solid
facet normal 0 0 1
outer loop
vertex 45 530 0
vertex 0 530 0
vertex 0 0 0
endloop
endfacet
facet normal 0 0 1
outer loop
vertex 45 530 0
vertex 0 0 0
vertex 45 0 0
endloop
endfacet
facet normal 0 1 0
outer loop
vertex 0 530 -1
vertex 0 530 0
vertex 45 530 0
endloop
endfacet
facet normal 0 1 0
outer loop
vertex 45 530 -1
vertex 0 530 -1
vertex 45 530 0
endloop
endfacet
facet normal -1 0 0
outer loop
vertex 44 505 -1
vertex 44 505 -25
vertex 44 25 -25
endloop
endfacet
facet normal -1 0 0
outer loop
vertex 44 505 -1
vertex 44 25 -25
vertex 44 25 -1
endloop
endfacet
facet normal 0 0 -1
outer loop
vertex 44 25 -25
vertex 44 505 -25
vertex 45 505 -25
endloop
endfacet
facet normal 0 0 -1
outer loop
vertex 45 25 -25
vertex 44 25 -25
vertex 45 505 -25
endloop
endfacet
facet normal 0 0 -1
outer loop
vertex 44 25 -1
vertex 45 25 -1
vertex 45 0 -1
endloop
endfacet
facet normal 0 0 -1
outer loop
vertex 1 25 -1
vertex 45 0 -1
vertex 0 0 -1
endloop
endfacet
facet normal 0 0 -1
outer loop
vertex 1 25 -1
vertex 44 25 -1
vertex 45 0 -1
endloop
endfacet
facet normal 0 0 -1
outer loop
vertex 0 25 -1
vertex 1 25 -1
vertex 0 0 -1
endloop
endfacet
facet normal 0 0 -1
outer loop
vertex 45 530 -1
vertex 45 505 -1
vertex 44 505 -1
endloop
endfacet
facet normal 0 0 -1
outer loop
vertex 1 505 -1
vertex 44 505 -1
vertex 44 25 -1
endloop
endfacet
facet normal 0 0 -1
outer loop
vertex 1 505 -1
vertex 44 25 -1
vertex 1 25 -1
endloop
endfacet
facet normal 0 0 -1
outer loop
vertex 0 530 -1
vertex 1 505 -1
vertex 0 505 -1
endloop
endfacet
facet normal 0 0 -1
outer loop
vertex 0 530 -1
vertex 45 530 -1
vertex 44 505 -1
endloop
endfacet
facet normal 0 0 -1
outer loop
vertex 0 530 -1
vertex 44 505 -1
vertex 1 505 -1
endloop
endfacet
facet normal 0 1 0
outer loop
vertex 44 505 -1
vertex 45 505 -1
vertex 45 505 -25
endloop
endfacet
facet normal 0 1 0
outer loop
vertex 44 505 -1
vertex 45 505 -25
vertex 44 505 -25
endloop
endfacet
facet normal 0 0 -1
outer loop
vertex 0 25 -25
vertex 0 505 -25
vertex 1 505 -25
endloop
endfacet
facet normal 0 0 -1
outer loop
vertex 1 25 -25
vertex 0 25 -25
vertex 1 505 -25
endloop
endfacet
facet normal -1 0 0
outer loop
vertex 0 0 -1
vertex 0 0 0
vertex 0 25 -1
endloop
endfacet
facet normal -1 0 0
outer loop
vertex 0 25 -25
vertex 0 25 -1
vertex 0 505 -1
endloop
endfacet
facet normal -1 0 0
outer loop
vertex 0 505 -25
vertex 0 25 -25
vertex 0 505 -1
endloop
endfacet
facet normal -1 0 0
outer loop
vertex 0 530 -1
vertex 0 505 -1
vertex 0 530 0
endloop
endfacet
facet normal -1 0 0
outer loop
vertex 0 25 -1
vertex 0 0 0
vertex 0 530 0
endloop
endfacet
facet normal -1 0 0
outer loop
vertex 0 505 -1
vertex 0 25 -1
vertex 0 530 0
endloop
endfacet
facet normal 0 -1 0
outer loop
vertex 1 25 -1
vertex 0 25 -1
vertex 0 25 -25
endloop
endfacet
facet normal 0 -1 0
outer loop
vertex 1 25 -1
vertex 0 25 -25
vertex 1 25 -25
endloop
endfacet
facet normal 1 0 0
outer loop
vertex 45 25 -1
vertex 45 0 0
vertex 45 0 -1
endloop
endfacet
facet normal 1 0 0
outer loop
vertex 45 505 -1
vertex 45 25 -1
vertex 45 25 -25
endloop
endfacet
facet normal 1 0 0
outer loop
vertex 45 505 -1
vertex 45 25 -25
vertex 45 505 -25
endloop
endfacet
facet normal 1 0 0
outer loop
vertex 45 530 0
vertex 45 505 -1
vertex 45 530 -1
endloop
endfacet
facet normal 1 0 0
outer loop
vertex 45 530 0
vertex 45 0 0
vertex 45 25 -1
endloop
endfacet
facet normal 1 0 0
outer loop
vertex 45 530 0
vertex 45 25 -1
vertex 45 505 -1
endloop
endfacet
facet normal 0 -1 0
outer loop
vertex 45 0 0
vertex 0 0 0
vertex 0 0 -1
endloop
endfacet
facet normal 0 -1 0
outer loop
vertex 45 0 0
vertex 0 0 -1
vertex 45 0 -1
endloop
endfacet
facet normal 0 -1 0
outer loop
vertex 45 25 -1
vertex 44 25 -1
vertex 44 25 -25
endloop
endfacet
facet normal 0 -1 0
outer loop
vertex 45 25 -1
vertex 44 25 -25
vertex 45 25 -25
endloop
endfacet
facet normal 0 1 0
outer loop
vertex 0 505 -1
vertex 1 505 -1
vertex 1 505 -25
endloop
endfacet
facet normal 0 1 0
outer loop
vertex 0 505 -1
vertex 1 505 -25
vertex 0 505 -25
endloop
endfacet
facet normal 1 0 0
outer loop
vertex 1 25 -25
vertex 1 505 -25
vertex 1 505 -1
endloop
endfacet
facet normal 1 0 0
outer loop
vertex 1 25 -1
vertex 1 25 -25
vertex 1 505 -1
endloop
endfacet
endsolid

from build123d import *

# Parameters (mm, degrees)
F0_W     = 45
F0_H     = 530
F1_DEPTH = 25
F2_W     = 45
F2_H     = 24
F3_DEPTH = 25
F4_W     = 45
F4_H     = 24
F5_DEPTH = 25
F6_W     = 43
F6_H     = 24
F7_DEPTH = 505.001


with BuildPart() as f1:
    # F0 (on Top) → F1 (new body)
    with BuildSketch(Plane.XY):
        with Locations((22.5, 265)):
            Rectangle(F0_W, F0_H)
    extrude(amount=-F1_DEPTH)

    # F2 (on face) → F3 (cut)
    with BuildSketch(Plane.XZ):
        with Locations((22.5, -13)):
            Rectangle(F2_W, F2_H)
    extrude(amount=-F3_DEPTH, mode=Mode.SUBTRACT)

    # F4 (on face) → F5 (cut)
    with BuildSketch(Plane(origin=(0, 530, 0), x_dir=(-1, 0, 0), z_dir=(0, 1, 0))):
        with Locations((-22.5, -13)):
            Rectangle(F4_W, F4_H)
    extrude(amount=-F5_DEPTH, mode=Mode.SUBTRACT)

    # F6 (on face) → F7 (cut, through all)
    with BuildSketch(Plane(origin=(0, 505, 0), x_dir=(-1, 0, 0), z_dir=(0, 1, 0))):
        with Locations((-22.5, -13)):
            Rectangle(F6_W, F6_H)
    extrude(amount=-F7_DEPTH, mode=Mode.SUBTRACT)


solid = f1.part
